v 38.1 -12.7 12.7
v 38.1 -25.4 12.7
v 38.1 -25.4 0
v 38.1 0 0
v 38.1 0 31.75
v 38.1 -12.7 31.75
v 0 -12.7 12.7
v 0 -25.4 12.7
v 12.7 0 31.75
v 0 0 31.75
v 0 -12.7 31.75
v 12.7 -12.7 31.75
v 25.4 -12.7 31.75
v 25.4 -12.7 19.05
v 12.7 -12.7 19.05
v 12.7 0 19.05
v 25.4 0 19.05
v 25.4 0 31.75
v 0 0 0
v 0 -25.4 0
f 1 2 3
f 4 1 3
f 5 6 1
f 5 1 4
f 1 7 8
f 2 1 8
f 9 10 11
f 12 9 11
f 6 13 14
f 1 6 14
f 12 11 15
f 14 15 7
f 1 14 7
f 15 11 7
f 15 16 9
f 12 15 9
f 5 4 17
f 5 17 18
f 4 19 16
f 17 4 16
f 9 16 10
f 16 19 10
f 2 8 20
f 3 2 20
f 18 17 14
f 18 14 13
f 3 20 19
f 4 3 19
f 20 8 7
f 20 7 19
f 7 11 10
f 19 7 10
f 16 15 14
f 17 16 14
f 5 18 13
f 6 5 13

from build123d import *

# Parameters (mm, degrees)
F1_DEPTH = 38.1
F2_W     = 12.7
F2_H     = 12.7
F3_DEPTH = 228.6


with BuildPart() as f1:
    # F0 (on Right) → F1 (new body)
    with BuildSketch(Plane.YZ):
        Polygon((-25.4, 0), (0, 0), (0, 31.75), (-12.7, 31.75), (-12.7, 12.7), (-25.4, 12.7), align=None)
    extrude(amount=F1_DEPTH)

    # F2 (on Front) → F3 (cut)
    with BuildSketch(Plane.XZ):
        with Locations((19.05, 25.4)):
            Rectangle(F2_W, F2_H)
    extrude(amount=F3_DEPTH, mode=Mode.SUBTRACT)


solid = f1.part
